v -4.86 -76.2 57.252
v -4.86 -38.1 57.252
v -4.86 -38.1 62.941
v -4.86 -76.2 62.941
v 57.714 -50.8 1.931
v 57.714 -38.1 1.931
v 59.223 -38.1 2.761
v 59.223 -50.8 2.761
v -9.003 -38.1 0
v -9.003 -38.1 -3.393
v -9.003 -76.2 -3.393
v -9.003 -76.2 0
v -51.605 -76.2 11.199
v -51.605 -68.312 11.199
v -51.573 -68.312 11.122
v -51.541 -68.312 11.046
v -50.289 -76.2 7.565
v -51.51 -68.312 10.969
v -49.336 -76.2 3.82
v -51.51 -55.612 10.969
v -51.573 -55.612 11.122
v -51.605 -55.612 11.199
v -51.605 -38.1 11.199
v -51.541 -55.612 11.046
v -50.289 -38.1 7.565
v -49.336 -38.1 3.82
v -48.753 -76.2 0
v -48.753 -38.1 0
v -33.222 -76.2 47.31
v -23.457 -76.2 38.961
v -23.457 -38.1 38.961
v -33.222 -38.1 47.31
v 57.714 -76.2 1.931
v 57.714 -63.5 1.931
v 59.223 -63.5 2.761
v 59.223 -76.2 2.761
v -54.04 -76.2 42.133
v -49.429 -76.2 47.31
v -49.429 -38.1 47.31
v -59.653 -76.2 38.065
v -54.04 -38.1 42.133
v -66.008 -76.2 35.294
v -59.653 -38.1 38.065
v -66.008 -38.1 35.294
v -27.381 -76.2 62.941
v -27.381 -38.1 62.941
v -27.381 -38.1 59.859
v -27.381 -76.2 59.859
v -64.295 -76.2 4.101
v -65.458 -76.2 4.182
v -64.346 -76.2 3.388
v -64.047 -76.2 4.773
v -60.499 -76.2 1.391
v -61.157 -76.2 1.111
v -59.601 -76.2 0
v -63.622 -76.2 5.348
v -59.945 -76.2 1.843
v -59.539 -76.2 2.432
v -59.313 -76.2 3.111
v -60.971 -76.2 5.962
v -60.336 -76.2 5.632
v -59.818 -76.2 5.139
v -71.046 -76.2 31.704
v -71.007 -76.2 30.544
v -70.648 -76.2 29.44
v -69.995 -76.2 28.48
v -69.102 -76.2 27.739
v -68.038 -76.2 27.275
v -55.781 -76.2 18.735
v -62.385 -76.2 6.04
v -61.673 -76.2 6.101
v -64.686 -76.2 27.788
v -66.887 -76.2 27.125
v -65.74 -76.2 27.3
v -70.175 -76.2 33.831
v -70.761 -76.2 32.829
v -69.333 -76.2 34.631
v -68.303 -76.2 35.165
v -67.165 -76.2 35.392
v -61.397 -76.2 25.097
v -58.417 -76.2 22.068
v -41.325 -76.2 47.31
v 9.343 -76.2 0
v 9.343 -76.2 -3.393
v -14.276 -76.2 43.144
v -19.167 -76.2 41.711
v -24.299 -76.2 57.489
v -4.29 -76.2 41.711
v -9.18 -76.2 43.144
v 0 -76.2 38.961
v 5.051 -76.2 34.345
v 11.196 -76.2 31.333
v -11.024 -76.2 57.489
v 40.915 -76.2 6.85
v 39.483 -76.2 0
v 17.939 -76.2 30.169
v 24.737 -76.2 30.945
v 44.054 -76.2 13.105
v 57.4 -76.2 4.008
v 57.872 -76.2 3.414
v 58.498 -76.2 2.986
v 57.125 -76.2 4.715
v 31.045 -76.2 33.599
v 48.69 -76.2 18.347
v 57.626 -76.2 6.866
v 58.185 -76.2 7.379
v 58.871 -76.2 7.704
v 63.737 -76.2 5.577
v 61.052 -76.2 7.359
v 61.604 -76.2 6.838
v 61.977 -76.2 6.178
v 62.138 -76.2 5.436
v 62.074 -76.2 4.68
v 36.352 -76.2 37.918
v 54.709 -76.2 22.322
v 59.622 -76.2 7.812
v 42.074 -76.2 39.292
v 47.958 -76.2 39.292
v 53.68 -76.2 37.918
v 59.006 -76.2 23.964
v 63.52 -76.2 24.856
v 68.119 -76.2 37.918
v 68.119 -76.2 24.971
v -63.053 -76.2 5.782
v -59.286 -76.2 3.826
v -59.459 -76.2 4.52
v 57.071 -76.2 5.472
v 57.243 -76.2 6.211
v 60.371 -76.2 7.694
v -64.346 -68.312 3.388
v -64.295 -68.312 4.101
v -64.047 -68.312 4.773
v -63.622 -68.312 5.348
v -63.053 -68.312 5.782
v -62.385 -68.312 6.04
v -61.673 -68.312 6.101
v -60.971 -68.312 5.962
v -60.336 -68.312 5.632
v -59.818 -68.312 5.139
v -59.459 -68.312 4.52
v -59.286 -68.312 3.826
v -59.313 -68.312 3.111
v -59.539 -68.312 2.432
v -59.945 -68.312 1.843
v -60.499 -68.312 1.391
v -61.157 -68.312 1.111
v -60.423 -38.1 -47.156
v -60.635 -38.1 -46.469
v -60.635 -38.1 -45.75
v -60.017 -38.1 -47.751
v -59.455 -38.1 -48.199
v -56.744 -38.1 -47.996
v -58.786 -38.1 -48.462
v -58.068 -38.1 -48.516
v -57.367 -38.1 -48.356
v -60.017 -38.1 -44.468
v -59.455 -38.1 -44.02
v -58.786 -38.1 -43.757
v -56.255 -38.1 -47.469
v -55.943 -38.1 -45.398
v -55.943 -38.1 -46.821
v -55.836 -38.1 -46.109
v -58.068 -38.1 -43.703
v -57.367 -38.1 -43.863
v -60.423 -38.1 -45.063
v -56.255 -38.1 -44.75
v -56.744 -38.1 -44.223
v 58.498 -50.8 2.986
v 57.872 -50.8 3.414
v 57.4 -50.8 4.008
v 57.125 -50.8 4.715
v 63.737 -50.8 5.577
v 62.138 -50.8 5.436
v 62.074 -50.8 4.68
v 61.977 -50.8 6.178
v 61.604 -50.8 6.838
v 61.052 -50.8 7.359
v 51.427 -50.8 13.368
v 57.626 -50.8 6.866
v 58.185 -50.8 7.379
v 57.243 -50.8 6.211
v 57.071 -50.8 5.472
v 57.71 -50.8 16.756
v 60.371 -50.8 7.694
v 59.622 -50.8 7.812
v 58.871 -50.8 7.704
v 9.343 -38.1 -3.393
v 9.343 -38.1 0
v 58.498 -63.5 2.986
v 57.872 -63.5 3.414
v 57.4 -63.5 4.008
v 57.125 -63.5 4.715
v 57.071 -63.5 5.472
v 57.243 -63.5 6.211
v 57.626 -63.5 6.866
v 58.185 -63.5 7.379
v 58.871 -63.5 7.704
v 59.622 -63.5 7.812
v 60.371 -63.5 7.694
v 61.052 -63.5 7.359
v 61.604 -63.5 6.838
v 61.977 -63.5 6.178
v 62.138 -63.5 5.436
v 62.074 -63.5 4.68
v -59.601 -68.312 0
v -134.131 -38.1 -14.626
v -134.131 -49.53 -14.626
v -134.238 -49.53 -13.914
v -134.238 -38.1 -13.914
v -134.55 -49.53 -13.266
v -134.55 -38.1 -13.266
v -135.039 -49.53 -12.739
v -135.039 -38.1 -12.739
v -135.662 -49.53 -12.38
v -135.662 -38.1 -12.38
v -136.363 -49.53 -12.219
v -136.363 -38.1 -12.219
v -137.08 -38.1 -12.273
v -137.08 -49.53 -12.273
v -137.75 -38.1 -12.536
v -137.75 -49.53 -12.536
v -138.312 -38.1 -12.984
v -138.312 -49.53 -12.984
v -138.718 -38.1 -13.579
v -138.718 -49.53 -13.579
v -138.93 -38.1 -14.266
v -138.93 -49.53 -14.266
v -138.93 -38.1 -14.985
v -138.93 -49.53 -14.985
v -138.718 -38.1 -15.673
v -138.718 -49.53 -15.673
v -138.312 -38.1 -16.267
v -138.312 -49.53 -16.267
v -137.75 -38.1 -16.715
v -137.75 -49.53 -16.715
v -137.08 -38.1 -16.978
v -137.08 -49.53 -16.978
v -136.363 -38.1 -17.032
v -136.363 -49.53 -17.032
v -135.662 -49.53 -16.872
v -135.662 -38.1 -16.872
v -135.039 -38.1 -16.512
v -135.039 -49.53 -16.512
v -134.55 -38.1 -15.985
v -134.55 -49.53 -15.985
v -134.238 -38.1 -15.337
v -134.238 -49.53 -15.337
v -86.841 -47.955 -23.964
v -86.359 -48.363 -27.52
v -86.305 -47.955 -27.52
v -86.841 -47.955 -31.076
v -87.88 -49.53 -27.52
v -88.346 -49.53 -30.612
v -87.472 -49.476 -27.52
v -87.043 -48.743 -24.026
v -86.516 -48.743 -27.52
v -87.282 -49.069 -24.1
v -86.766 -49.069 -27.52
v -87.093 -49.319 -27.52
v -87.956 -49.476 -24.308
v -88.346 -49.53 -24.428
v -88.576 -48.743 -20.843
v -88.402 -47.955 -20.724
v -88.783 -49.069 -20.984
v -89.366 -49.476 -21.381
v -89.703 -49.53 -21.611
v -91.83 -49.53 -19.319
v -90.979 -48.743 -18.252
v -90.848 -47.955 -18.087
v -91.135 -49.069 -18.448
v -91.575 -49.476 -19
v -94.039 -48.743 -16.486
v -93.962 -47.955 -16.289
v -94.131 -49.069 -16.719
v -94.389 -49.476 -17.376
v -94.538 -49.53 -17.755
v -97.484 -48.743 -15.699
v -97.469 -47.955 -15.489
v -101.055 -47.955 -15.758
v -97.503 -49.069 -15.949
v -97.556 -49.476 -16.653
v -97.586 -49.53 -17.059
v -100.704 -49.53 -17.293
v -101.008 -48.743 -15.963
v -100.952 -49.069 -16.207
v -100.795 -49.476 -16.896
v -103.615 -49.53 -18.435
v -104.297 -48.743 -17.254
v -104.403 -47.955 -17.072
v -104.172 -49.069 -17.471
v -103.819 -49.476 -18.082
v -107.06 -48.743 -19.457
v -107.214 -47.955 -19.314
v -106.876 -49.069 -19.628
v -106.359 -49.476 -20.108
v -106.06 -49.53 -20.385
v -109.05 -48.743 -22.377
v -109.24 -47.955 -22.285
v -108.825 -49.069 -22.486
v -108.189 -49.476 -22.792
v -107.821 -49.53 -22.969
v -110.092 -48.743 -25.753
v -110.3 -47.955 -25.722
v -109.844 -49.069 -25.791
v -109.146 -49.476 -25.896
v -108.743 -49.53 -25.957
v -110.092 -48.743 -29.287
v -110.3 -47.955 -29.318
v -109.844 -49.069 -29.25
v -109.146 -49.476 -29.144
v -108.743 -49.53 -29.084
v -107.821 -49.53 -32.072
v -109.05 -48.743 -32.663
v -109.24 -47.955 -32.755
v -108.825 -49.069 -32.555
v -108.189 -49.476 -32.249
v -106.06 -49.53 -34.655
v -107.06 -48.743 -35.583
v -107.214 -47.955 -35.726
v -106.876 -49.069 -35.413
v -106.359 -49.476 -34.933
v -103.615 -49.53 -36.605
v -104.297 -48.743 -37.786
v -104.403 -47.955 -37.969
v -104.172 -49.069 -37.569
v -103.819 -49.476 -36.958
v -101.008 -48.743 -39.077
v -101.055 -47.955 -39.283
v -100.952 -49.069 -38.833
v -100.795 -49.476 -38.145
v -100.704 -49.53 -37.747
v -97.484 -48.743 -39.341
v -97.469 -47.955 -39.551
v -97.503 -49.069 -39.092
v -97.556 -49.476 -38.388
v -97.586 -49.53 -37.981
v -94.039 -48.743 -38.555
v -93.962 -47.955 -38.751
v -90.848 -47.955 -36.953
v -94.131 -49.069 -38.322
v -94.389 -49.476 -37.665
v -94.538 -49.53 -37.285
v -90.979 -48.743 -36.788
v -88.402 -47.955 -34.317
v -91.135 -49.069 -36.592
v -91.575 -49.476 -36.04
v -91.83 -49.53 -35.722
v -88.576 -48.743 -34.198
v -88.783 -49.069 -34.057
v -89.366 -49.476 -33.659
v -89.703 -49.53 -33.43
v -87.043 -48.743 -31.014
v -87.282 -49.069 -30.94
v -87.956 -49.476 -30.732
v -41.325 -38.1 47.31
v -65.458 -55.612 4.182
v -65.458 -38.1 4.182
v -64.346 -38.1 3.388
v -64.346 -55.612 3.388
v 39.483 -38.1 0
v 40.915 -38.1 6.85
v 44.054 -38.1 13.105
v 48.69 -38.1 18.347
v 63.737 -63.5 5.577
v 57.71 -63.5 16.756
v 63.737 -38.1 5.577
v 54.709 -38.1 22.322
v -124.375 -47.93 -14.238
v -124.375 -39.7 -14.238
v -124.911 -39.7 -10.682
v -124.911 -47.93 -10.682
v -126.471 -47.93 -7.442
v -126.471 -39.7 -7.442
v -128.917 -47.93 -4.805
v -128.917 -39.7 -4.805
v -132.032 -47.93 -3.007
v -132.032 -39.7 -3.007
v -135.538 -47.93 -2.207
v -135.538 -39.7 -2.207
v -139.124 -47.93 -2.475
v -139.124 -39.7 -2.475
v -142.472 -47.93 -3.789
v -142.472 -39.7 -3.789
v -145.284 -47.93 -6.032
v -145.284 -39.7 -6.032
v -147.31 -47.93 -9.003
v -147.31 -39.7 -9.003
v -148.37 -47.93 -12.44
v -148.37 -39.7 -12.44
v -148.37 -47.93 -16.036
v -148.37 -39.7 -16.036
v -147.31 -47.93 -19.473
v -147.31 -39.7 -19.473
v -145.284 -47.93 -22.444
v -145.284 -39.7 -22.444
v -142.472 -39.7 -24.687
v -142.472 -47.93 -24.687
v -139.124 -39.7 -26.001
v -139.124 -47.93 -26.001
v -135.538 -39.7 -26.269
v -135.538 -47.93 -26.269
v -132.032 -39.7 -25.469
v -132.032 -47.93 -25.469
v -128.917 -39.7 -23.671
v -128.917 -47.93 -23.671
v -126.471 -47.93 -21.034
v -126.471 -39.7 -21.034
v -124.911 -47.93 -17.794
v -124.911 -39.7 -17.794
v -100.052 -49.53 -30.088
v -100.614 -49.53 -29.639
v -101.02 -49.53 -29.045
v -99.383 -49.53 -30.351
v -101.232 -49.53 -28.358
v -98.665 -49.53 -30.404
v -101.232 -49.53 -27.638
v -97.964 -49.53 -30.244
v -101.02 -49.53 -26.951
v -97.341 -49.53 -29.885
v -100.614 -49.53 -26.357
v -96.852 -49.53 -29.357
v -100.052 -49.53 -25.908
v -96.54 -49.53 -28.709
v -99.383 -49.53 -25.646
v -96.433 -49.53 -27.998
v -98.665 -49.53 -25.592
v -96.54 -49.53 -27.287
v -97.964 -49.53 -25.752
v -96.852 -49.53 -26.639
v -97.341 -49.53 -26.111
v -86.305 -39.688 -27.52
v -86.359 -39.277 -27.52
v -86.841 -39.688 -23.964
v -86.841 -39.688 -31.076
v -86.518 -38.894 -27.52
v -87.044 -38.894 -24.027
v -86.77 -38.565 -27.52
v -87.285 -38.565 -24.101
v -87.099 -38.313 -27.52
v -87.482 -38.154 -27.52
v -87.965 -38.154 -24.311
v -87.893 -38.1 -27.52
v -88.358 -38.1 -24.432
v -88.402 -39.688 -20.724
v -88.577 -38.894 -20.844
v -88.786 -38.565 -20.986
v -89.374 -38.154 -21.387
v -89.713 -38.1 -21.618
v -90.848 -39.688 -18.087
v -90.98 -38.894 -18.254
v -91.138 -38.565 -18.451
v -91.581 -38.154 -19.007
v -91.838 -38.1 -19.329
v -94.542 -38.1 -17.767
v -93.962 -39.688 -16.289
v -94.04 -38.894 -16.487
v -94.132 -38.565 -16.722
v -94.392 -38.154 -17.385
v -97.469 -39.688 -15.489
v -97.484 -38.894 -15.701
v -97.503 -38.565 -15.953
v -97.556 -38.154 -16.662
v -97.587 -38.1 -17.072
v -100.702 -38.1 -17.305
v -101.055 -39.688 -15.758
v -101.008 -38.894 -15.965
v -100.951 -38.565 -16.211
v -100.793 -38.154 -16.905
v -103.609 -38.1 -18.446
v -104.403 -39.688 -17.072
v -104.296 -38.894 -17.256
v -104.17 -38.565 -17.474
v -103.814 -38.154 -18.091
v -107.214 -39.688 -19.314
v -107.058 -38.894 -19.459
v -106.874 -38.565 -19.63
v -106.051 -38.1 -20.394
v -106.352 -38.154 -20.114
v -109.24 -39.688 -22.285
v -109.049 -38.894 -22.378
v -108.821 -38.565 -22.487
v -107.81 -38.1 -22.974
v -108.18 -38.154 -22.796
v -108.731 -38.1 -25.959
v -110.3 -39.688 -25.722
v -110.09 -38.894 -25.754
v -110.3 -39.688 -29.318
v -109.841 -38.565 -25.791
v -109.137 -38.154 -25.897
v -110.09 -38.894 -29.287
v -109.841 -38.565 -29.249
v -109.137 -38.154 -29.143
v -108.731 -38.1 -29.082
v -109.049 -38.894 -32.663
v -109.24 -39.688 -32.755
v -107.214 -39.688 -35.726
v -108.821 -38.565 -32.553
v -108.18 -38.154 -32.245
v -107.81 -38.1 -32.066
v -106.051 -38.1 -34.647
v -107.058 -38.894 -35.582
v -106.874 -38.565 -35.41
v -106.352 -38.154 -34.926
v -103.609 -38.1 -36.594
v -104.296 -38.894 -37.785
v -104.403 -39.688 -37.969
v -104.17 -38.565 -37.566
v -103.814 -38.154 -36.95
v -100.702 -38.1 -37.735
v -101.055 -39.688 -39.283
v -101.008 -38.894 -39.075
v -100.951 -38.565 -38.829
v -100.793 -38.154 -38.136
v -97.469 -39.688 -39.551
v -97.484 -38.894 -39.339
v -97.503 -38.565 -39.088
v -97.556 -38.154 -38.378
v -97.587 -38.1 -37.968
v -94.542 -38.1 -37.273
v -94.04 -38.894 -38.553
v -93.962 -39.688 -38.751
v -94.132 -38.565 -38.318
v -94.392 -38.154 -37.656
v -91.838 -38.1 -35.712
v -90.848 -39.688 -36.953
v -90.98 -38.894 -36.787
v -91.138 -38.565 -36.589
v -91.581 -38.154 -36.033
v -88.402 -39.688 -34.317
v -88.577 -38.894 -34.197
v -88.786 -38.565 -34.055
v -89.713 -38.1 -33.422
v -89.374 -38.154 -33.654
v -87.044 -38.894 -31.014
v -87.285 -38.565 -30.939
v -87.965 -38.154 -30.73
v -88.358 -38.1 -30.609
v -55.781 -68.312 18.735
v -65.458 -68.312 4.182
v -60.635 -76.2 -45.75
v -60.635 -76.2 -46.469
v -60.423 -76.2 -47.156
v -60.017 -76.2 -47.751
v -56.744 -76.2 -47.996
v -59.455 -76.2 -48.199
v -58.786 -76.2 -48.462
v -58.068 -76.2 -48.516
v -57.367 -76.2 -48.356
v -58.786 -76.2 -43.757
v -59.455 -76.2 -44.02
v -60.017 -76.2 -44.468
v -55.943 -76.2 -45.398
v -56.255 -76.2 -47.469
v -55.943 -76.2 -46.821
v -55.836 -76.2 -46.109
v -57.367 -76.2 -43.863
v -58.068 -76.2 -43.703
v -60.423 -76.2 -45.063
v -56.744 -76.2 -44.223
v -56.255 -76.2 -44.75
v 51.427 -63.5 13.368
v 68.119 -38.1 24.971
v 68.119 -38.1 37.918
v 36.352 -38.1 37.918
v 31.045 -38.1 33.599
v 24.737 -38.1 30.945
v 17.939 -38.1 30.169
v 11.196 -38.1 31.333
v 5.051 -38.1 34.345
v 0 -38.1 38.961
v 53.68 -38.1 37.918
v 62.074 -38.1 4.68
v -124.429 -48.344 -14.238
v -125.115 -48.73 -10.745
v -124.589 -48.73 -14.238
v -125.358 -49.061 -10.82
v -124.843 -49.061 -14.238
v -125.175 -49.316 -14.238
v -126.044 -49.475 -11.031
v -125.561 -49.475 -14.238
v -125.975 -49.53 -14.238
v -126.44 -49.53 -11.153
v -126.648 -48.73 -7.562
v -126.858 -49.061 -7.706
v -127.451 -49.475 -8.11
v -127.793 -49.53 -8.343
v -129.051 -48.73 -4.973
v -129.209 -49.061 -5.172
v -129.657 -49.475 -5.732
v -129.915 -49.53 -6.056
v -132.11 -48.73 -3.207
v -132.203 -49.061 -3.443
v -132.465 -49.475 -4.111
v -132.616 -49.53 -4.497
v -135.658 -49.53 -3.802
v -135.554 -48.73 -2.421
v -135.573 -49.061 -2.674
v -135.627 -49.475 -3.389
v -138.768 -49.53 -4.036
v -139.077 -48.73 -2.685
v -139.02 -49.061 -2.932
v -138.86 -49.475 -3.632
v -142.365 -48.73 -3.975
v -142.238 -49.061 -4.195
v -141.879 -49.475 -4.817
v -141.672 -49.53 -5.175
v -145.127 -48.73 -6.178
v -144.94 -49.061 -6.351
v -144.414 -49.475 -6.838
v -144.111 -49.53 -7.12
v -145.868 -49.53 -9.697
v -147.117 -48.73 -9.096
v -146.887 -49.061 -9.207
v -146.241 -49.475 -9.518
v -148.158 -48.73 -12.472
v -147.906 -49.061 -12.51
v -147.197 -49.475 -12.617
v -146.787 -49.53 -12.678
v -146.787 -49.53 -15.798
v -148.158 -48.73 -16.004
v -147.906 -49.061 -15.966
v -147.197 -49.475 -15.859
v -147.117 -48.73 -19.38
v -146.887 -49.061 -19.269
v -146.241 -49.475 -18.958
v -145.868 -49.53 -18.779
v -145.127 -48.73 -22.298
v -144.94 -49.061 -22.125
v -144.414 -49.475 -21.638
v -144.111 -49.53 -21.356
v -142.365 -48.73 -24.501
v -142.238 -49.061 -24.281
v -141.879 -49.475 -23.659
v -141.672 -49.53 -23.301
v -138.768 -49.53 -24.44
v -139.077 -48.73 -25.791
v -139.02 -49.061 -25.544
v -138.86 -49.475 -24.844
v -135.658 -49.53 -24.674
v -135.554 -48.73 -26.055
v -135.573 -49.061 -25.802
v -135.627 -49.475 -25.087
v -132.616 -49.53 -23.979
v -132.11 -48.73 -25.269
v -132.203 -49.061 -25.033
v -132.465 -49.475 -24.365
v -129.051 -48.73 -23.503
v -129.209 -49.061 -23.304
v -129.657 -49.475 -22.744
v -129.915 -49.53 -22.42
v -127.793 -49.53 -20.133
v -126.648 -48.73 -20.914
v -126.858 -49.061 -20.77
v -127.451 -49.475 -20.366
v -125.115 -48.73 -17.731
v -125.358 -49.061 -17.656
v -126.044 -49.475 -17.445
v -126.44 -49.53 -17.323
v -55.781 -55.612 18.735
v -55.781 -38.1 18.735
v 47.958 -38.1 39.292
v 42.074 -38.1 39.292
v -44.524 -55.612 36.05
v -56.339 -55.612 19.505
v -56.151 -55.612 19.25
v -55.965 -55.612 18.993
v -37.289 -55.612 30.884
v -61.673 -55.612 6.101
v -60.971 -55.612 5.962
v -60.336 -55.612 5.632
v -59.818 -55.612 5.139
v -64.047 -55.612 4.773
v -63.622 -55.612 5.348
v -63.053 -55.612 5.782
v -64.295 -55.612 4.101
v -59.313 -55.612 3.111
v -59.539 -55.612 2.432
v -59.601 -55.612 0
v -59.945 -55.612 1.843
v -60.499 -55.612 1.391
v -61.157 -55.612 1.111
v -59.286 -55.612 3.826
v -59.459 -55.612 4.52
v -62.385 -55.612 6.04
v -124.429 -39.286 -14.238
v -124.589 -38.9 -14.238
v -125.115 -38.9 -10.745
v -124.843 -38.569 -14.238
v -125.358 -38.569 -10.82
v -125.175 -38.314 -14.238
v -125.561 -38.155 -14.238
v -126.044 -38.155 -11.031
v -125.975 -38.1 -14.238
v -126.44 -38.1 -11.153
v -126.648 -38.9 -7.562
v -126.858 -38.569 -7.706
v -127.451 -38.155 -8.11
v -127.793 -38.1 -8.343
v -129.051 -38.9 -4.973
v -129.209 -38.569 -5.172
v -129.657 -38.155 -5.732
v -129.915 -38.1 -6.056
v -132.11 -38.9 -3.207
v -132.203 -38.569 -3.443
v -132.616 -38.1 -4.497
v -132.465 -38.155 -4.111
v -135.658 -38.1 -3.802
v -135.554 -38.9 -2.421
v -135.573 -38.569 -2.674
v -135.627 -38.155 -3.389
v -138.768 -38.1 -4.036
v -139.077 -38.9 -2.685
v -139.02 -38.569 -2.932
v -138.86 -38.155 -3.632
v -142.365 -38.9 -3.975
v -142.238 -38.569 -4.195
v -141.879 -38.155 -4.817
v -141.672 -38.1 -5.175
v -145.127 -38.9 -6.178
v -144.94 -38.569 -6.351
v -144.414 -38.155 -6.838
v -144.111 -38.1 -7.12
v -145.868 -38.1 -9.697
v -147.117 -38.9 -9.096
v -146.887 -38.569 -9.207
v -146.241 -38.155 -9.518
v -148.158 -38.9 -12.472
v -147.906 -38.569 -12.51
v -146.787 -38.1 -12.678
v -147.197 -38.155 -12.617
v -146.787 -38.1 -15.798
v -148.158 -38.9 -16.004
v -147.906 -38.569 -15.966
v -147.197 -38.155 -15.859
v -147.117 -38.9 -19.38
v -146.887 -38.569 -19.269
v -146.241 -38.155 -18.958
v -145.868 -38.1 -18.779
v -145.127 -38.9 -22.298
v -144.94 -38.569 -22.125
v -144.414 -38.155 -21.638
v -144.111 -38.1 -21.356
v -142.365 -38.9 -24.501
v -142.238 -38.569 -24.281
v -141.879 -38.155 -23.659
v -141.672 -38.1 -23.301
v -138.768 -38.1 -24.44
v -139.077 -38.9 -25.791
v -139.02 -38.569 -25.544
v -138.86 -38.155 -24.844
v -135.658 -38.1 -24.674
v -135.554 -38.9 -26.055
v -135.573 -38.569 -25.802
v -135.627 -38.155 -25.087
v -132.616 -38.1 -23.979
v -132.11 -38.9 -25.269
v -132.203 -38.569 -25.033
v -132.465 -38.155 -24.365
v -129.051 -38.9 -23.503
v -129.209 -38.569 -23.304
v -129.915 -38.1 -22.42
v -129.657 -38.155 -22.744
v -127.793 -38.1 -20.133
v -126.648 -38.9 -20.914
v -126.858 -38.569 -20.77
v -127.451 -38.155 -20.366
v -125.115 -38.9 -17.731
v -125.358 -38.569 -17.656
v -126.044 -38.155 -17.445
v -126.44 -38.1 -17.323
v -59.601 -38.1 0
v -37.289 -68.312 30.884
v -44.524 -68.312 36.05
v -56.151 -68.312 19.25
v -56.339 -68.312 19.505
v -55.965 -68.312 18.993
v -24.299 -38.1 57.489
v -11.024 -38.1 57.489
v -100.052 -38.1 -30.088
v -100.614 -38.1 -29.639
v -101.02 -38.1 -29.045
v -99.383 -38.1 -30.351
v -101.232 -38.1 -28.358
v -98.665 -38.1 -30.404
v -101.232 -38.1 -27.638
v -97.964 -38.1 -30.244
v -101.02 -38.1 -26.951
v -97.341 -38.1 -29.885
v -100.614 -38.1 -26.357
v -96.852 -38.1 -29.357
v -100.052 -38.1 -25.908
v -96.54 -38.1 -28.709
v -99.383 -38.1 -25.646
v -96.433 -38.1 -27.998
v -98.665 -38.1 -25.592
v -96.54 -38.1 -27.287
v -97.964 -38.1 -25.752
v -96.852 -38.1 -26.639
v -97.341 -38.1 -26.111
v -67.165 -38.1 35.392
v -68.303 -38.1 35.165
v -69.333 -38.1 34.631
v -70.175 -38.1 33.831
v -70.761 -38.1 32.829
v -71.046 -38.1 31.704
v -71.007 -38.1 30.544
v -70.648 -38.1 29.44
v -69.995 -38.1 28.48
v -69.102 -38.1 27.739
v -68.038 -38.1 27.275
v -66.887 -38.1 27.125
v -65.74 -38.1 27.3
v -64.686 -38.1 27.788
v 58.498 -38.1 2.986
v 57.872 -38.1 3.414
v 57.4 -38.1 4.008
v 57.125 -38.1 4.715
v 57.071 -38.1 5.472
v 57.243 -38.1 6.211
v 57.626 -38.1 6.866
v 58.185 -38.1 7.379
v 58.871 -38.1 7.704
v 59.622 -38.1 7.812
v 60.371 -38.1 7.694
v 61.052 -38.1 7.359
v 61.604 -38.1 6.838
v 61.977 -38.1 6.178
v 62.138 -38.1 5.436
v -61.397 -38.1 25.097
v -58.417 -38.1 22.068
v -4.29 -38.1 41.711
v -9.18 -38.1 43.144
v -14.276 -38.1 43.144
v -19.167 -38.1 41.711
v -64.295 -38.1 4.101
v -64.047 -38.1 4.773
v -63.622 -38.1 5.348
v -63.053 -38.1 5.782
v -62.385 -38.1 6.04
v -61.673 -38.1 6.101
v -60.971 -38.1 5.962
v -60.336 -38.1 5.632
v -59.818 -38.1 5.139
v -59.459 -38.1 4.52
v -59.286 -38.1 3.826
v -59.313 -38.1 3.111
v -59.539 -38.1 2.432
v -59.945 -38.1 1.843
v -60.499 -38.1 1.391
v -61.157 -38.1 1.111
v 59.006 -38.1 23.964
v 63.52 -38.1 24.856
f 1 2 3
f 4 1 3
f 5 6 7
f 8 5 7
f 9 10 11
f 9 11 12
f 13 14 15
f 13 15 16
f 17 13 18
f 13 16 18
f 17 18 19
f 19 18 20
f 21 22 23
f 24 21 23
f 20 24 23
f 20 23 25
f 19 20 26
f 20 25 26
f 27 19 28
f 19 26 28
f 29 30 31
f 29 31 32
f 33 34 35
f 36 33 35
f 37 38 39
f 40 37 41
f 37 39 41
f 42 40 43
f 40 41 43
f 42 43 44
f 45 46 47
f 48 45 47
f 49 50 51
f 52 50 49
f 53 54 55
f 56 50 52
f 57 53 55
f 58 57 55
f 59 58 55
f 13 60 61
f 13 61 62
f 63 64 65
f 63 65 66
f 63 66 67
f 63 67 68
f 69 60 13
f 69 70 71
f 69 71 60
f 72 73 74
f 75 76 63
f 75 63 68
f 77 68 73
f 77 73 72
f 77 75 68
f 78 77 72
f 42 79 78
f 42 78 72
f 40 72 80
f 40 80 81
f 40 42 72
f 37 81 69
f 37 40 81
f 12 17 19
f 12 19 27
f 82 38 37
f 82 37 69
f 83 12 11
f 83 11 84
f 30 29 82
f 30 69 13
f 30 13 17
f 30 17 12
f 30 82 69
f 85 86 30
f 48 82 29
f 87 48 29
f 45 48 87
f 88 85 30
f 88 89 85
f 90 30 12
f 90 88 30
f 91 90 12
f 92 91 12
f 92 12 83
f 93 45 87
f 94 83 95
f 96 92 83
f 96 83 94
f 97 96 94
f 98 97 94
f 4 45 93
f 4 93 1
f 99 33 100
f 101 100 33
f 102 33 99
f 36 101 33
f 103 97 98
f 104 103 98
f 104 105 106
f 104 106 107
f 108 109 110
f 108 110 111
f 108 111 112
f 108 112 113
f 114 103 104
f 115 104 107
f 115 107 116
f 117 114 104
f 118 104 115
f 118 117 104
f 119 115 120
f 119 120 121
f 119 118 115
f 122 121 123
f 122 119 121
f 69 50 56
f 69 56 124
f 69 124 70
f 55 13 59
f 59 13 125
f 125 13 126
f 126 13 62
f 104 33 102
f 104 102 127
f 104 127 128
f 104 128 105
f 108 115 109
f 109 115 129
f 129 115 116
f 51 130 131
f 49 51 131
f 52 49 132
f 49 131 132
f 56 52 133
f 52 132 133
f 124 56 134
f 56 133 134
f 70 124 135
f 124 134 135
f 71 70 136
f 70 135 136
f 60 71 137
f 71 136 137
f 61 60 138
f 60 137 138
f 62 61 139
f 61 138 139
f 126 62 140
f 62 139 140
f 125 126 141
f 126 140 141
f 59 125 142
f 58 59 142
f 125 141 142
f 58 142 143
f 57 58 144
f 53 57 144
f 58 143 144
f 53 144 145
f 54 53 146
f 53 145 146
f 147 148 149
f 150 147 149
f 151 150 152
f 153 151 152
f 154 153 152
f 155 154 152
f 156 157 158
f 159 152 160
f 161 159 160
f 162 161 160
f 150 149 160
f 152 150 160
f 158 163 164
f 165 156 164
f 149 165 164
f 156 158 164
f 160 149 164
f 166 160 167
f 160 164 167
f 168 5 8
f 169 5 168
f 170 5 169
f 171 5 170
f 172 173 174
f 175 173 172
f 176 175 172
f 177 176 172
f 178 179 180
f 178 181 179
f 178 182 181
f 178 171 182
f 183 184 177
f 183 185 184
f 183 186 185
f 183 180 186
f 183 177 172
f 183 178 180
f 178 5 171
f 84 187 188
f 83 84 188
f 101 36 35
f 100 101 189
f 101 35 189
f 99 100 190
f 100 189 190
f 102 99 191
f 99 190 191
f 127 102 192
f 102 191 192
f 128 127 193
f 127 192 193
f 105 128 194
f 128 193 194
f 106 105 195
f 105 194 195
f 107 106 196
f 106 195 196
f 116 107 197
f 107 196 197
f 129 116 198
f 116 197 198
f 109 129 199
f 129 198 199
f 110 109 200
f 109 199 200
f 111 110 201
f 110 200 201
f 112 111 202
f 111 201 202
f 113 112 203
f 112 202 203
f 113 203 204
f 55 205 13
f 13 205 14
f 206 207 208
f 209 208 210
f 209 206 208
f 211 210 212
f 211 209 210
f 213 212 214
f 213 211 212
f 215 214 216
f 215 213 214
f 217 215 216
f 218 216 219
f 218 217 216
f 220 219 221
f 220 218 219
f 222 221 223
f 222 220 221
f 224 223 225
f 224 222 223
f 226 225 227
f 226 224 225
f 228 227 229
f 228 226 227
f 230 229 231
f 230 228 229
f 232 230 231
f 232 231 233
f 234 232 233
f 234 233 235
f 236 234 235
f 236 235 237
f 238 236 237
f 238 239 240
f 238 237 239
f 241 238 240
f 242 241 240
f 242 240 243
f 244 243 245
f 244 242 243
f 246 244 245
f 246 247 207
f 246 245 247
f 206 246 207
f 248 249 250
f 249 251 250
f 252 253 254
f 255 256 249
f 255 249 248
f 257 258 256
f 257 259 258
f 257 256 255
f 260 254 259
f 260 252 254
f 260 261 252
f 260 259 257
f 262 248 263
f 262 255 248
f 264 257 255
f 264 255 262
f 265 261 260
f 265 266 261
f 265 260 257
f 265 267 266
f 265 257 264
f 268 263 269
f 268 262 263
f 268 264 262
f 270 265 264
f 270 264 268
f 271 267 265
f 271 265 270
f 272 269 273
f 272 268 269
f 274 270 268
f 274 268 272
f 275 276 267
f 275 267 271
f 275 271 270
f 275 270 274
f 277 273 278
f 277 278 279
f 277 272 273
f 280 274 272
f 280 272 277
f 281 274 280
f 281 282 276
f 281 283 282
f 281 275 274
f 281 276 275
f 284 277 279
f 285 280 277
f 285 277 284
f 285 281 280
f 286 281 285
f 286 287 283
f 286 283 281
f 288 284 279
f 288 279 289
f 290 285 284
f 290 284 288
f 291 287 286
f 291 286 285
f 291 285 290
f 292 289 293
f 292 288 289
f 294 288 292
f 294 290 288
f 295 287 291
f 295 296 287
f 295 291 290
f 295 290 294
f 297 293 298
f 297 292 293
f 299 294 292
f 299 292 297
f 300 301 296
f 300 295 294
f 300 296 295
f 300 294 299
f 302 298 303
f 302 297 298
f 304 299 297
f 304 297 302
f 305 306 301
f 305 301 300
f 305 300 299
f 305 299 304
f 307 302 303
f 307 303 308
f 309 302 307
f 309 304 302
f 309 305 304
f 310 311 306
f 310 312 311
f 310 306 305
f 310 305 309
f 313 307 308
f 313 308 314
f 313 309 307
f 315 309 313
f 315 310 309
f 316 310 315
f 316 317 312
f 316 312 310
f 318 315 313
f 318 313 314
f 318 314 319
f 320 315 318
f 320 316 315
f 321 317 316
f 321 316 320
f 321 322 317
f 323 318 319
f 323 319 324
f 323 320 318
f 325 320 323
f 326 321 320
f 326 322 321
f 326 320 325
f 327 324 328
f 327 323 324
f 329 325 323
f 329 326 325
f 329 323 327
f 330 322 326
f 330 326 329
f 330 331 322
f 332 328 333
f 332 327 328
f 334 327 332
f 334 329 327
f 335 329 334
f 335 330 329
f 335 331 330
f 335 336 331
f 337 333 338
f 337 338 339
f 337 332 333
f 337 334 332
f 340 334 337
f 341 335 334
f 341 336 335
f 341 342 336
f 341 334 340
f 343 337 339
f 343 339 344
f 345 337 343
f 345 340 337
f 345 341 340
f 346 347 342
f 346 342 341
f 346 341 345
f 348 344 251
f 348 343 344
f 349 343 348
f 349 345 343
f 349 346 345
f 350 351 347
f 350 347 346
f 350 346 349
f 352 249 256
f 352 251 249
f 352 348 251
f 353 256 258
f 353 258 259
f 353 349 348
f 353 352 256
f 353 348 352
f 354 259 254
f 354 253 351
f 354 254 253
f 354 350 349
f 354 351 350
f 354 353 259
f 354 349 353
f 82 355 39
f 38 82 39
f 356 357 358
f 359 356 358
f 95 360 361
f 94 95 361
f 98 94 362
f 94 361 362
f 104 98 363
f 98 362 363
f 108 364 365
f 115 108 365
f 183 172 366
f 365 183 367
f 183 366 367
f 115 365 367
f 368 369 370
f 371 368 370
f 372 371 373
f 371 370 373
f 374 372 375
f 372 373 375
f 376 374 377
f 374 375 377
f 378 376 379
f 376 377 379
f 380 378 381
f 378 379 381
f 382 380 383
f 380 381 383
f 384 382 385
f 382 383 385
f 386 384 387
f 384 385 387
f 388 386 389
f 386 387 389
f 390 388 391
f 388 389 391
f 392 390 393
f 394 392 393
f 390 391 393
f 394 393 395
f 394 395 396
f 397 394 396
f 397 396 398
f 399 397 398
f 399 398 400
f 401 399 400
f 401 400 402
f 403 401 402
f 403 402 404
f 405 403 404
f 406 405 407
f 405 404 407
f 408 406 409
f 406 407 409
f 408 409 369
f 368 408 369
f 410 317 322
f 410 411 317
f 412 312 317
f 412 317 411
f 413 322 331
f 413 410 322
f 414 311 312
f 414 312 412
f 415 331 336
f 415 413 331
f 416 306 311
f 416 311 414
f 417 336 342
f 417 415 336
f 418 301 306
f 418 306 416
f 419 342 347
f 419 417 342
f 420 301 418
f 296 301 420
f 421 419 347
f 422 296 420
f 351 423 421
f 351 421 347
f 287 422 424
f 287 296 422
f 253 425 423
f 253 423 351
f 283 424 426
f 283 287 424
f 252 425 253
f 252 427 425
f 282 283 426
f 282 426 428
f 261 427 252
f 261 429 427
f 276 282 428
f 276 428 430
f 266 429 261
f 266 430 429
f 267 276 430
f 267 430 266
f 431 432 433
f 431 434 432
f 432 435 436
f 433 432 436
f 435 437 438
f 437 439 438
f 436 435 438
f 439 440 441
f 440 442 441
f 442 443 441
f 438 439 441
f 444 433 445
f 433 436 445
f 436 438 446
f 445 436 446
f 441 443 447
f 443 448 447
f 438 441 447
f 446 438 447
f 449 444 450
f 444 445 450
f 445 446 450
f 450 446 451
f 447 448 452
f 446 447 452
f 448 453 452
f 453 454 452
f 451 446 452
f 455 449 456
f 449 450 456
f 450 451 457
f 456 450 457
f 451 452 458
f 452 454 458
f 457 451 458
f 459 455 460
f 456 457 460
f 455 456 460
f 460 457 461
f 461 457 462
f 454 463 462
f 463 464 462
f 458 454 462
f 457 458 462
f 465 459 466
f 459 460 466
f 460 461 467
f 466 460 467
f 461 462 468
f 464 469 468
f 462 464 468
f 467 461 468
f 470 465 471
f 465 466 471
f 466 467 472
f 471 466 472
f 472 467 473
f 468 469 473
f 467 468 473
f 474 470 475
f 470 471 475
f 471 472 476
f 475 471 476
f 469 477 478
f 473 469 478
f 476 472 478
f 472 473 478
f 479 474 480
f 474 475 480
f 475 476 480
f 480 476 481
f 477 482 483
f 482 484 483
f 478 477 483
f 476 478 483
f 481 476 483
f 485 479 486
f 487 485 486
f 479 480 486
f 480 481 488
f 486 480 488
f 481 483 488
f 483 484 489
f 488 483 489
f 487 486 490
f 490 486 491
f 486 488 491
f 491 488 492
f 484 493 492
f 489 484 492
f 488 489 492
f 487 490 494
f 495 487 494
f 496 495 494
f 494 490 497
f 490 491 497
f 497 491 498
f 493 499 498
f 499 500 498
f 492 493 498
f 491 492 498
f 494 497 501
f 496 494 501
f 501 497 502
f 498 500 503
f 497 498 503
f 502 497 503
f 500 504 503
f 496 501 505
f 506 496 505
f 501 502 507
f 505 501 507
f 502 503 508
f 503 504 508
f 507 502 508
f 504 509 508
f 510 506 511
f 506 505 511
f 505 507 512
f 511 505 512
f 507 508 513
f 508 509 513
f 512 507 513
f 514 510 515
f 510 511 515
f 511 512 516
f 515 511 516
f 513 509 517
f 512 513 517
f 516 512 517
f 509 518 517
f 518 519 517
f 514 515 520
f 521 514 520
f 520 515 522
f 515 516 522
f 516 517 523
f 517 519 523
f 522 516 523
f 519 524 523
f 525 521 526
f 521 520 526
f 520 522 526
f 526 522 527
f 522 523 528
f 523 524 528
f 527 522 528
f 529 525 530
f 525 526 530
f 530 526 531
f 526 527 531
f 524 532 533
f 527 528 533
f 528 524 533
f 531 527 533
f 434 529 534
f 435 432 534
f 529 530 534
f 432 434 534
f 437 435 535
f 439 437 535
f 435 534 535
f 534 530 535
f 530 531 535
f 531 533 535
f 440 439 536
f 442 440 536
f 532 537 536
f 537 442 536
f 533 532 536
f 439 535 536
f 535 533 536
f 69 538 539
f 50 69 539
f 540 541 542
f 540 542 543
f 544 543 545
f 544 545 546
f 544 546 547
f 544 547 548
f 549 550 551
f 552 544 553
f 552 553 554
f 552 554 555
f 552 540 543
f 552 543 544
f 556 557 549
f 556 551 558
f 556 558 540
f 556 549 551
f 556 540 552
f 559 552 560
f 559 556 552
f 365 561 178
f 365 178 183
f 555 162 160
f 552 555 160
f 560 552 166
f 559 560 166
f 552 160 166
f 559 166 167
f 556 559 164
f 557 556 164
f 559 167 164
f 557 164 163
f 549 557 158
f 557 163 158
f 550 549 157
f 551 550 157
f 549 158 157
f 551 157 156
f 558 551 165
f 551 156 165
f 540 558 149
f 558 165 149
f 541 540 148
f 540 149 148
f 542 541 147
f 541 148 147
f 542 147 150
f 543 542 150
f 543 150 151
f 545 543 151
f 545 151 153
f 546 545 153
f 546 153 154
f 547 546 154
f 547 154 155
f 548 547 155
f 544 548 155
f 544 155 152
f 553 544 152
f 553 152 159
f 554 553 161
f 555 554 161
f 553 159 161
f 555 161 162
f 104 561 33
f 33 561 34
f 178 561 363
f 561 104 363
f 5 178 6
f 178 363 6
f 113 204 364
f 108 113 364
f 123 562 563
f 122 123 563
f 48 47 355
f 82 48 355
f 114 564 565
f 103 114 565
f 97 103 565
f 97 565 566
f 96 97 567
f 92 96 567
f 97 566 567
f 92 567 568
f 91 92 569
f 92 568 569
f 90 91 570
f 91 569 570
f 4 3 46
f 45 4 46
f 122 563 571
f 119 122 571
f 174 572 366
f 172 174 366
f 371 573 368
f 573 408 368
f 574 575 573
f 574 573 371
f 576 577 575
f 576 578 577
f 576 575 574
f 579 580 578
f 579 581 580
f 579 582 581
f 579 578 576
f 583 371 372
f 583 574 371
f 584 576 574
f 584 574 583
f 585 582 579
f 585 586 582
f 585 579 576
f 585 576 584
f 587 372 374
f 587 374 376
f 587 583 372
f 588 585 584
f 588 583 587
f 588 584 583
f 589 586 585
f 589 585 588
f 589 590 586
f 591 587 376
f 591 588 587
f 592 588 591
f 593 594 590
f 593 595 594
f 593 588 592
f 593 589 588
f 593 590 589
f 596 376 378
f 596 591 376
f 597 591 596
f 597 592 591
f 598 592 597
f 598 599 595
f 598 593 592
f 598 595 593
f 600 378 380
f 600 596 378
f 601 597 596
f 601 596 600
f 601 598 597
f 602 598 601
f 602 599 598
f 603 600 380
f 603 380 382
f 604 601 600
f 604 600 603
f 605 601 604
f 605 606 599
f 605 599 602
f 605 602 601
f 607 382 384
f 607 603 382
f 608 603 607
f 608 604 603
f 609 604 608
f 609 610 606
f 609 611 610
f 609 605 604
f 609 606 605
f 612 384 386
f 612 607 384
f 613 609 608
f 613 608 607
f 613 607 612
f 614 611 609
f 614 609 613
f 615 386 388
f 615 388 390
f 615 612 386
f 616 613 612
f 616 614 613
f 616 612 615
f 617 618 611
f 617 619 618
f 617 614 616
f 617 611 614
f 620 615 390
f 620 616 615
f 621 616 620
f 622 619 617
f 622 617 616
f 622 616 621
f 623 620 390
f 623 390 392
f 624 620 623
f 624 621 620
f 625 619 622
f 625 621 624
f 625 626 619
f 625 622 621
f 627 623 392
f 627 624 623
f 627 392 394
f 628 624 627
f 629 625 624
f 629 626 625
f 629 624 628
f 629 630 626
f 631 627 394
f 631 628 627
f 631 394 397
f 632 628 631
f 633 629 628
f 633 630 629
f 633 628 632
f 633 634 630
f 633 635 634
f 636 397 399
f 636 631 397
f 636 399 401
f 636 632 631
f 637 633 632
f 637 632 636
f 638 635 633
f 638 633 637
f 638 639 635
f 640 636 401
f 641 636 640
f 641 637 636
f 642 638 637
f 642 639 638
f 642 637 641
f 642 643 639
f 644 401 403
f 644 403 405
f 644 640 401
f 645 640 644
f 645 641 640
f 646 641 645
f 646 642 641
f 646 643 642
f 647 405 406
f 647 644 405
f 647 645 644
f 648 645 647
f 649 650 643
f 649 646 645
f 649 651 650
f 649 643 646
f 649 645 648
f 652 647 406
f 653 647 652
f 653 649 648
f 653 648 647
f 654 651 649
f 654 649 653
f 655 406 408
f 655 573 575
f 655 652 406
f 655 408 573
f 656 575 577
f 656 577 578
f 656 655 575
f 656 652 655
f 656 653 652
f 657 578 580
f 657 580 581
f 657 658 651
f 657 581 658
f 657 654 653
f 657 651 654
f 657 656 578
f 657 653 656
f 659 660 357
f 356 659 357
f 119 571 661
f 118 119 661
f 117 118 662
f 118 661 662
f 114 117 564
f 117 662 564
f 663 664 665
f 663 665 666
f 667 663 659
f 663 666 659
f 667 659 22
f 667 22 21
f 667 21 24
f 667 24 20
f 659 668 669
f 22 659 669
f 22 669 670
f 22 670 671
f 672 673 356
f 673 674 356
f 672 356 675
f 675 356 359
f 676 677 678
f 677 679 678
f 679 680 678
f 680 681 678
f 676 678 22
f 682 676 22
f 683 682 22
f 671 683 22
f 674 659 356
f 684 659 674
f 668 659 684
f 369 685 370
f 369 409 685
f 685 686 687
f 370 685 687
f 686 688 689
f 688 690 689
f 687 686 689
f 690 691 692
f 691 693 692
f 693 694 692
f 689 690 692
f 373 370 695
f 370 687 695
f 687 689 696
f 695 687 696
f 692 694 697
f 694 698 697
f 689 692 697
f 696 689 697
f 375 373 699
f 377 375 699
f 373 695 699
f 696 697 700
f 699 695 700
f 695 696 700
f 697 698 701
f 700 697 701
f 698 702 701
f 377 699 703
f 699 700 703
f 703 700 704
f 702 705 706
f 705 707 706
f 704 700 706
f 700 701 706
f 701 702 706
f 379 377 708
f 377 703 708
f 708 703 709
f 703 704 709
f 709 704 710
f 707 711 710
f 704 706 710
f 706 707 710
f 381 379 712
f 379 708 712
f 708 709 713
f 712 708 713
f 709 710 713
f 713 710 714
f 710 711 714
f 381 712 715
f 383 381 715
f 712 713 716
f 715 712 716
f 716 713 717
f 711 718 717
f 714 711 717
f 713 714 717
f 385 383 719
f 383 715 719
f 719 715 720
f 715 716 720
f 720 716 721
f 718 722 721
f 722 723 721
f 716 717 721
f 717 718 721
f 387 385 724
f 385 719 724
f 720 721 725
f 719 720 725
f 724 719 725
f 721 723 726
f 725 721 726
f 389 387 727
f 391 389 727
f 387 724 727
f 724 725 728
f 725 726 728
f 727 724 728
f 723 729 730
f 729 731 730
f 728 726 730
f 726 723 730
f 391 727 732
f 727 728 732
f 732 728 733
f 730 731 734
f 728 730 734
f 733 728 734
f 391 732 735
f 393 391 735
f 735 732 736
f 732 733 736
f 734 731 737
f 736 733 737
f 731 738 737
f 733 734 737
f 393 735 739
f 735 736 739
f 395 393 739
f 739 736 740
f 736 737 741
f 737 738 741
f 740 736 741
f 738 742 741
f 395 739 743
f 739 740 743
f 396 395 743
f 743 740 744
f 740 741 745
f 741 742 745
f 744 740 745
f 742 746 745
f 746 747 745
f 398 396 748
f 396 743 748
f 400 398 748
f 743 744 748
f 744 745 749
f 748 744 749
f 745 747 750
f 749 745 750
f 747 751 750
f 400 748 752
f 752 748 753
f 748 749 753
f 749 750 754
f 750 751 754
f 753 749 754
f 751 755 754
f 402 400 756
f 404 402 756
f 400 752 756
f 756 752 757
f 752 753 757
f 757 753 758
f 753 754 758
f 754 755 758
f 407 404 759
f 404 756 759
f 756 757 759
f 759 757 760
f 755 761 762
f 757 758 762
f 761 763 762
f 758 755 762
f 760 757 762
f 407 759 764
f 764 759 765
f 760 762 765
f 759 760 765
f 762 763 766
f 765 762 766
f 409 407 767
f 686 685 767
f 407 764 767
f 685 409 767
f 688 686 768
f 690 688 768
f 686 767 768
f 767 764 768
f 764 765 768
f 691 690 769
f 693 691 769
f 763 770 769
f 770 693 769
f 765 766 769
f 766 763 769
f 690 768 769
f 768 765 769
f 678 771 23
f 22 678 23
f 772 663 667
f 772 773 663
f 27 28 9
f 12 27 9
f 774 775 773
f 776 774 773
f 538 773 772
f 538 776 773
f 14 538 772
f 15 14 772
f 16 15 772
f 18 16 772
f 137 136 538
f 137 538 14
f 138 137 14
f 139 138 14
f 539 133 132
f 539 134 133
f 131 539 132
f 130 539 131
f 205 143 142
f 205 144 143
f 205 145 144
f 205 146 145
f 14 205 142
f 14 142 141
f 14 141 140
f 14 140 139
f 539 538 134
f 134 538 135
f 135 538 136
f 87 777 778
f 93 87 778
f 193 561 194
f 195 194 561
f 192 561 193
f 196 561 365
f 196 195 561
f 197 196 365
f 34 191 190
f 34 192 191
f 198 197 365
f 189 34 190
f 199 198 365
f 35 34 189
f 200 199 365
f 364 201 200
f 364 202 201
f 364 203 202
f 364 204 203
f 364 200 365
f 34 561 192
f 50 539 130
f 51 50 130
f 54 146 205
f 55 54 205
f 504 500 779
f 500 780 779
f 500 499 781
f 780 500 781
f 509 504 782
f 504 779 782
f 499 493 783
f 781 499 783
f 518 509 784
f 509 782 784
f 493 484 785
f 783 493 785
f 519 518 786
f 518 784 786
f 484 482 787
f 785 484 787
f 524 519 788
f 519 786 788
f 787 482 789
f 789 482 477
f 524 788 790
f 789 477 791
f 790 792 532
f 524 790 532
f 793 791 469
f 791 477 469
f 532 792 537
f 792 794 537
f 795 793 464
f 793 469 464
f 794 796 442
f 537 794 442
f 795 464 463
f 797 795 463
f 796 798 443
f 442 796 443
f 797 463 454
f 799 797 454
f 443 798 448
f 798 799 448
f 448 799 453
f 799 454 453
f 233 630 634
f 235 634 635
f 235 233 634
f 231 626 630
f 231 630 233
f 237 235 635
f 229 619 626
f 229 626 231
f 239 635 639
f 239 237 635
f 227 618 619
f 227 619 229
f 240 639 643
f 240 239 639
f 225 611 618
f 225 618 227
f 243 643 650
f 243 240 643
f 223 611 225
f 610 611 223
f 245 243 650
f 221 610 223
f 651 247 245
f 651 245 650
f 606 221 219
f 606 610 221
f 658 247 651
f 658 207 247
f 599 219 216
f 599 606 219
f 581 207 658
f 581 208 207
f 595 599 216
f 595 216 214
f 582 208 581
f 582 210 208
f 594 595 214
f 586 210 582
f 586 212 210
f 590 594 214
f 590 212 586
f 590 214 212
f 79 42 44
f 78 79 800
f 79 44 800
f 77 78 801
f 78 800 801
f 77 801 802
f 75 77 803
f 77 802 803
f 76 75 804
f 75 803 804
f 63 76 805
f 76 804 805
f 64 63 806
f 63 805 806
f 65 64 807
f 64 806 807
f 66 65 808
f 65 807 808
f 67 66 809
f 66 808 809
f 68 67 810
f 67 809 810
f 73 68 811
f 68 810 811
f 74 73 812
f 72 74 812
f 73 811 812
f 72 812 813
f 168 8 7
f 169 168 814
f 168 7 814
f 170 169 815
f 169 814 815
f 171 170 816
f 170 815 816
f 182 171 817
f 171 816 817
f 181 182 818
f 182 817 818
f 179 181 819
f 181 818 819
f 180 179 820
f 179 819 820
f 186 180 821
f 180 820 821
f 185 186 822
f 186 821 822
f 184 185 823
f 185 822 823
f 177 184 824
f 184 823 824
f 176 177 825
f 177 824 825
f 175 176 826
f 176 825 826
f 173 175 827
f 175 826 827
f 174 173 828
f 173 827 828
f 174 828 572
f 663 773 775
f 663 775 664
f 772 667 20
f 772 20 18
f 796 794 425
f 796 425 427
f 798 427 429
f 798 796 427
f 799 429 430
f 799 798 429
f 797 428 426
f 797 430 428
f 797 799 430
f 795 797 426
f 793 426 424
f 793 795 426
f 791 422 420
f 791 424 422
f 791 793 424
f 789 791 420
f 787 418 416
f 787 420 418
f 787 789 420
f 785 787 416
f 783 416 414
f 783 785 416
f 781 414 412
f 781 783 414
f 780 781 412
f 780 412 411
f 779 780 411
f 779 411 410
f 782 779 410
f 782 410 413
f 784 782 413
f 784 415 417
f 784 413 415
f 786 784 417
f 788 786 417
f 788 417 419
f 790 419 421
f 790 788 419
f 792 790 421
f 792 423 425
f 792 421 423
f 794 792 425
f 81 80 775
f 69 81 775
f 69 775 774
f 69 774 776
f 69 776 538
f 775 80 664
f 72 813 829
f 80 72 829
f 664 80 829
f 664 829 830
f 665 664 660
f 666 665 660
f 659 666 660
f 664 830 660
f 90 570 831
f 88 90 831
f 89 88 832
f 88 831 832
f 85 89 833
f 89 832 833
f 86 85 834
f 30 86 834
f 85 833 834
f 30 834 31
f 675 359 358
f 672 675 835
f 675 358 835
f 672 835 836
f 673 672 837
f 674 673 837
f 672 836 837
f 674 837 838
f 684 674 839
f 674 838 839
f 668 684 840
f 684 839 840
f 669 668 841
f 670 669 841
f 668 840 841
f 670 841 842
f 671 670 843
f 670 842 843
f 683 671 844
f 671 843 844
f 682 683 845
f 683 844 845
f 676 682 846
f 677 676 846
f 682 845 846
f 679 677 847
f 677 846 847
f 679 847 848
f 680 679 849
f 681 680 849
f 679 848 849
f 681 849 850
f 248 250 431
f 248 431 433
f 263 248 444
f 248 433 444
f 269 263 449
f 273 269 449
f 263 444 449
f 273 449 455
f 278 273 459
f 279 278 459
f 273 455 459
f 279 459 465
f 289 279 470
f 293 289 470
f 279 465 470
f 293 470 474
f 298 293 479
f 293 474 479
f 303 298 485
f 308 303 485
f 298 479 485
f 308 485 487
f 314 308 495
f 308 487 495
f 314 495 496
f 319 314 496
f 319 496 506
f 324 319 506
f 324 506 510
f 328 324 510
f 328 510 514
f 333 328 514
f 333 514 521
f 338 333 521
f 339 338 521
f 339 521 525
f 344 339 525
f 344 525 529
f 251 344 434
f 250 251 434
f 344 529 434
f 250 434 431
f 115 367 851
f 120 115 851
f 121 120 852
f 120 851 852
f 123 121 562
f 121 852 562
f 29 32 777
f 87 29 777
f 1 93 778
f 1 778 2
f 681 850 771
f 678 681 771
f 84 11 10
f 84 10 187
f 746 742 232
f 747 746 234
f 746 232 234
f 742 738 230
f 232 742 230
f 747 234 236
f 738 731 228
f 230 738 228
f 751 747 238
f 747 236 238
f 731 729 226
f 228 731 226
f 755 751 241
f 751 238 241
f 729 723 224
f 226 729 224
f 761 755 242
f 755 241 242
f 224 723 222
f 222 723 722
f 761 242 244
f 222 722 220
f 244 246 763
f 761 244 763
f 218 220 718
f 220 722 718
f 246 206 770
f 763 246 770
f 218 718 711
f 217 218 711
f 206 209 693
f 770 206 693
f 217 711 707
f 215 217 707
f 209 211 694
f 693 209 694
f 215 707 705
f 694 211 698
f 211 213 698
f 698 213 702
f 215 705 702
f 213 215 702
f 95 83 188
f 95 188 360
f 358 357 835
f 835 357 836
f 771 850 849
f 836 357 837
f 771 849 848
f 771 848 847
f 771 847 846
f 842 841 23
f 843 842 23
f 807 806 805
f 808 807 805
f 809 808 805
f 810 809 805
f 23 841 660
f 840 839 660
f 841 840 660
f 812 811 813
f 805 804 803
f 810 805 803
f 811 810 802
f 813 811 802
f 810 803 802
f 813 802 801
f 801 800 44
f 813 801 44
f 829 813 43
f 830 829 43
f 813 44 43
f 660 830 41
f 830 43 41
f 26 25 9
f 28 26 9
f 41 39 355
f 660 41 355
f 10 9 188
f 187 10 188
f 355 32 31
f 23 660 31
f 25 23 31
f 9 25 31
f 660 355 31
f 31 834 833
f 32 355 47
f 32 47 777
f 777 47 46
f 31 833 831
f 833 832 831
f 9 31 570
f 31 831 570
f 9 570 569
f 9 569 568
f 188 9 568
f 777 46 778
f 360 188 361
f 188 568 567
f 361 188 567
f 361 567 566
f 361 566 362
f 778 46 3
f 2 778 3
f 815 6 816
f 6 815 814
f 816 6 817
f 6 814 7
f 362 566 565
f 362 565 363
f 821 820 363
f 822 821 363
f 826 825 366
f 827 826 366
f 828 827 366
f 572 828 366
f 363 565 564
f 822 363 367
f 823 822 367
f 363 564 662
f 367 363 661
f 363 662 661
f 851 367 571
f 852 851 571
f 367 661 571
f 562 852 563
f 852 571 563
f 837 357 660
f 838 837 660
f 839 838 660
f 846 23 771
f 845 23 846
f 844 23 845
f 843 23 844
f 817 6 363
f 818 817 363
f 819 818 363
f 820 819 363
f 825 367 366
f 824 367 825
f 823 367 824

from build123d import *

# Parameters (mm, degrees)
F1_W          = 18.346240744
F1_H          = 3.3933587838
F2_DEPTH      = 38.1
F3_W          = 7.62
F3_H          = 6.35
F4_DEPTH      = 12.7
F5_DEPTH      = 12.7
F5_DEPTH_BACK = 2.54
F7_W          = 7.62
F7_H          = 6.35
F8_DEPTH      = 25.4
F6_R          = 12.065
F9_DEPTH      = 11.43
F10_DEPTH     = 11.43
F11_R         = 1.5748
F12_R         = 1.5875
F13_DEPTH     = 12.7
F14_R         = 2.413
F15_DEPTH     = 38.1
F16_W         = 8.89
F16_H         = 6.35
F17_DEPTH     = 38.1
F18_R         = 12.065
F19_DEPTH     = 11.43
F20_DEPTH     = 38.1
F21_R         = 1.6002
F22_R         = 2.413
F23_DEPTH     = 25.4
F24_R         = 2.413
F25_DEPTH     = 50.8


with BuildPart() as f2:
    # F1 (on offset) → F2 (new body)
    with BuildSketch(Plane.XZ.offset(38.1)):
        with BuildLine():
            ThreePointArc((36.3523699343, 37.9177816212), (17.938739529, 30.168583093), (0, 38.961391896))
            ThreePointArc((0, 38.961391896), (-11.7283733562, 43.325750799), (-23.4567467123, 38.961391896))
            Line((-23.4567467123, 38.961391896), (-33.2215428352, 47.3102629185))
            Line((-33.2215428352, 47.3102629185), (-41.3254767033, 47.3102629185))
            Line((-41.3254767033, 47.3102629185), (-49.4294105714, 47.3102629185))
            ThreePointArc((-49.4294105714, 47.3102629185), (-56.7367498982, 39.9472569025), (-66.0079442432, 35.2936538851))
            Line((-66.0079442432, 35.2936538851), (-64.6862429176, 27.7878297377))
            ThreePointArc((-64.6862429176, 27.7878297377), (-59.8664666899, 23.6224354299), (-55.7805365855, 18.7351122561))
            ThreePointArc((-55.7805365855, 18.7351122561), (-53.4862447079, 15.0812512527), (-51.6049943174, 11.198549562))
            ThreePointArc((-51.6049943174, 11.198549562), (-49.7666461925, 5.7043305896), (-48.7534441054, 0))
            Line((-48.7534441054, 0), (-9.0032480657, 0))
            Line((-9.0032480657, 0), (9.3429926783, 0))
            Line((9.3429926783, 0), (39.4831933081, 0))
            ThreePointArc((39.4831933081, 0), (42.2814677608, 10.0792595054), (48.6897520328, 18.3470103953))
            ThreePointArc((48.6897520328, 18.3470103953), (51.5664674426, 20.5356473215), (54.7089455641, 22.3218316343))
            ThreePointArc((54.7089455641, 22.3218316343), (61.2440855838, 24.5062290424), (68.1189224124, 24.9712727964))
            Line((68.1189224124, 24.9712727964), (68.1189224124, 37.9177816212))
            Line((68.1189224124, 37.9177816212), (53.6801107228, 37.9177816212))
            ThreePointArc((53.6801107228, 37.9177816212), (45.0162403286, 39.4653134808), (36.3523699343, 37.9177816212))
        make_face()
        Polygon((-41.3254767033, 47.3102629185), (-33.2215428352, 47.3102629185), (-24.299332872, 57.4886649847), (-11.0235996544, 57.4886649847), (-11.0235996544, 62.9412010312), (-27.3812003434, 62.9412010312), (-27.3812003434, 59.8593354225), align=None)
        Polygon((-11.0235996544, 62.9412010312), (-11.0235996544, 57.4886649847), (-4.8598670401, 57.251598686), (-4.8598670401, 62.9412010312), align=None)
        with BuildLine():
            Line((63.7368187308, 5.5770496838), (54.7089455641, 22.3218316343))
            ThreePointArc((54.7089455641, 22.3218316343), (51.5664674426, 20.5356473215), (48.6897520328, 18.3470103953))
            Line((48.6897520328, 18.3470103953), (57.713739574, 1.9314482342))
            Line((57.713739574, 1.9314482342), (59.2228821475, 2.7610563614))
            ThreePointArc((59.2228821475, 2.7610563614), (58.1850528969, 7.3793378634), (62.0736384197, 4.6803535699))
            Line((62.0736384197, 4.6803535699), (63.7368187308, 5.5770496838))
        make_face()
        with BuildLine():
            Line((-64.6862429176, 27.7878297377), (-66.0079442432, 35.2936538851))
            ThreePointArc((-66.0079442432, 35.2936538851), (-71.0073326122, 30.5440297536), (-64.6862429176, 27.7878297377))
        make_face()
        with BuildLine():
            ThreePointArc((-51.6049943174, 11.198549562), (-53.4862447079, 15.0812512527), (-55.7805365855, 18.7351122561))
            Line((-55.7805365855, 18.7351122561), (-65.4575312239, 4.1816343999))
            Line((-65.4575312239, 4.1816343999), (-64.3459226379, 3.387893301))
            ThreePointArc((-64.3459226379, 3.387893301), (-60.3361013948, 5.6323350995), (-61.1573117392, 1.1110743286))
            Line((-61.1573117392, 1.1110743286), (-59.6012882888, 0))
            Line((-59.6012882888, 0), (-51.6049943174, 11.198549562))
        make_face()
        with Locations((0.1698723063, -1.6966793919)):
            Rectangle(F1_W, F1_H)
    extrude(amount=F2_DEPTH)

    # F3 (on face) → F4 (cut)
    with BuildSketch(Plane(origin=(12.0247195907, 0, -22.3032937929), x_dir=(0.8802196822, 0, 0.4745664454), z_dir=(0.4745664454, 0, -0.8802196822))):
        with Locations((54.9390829703, 53.975)):
            Rectangle(F3_W, F3_H)
        with Locations((54.9390829703, 60.325)):
            Rectangle(F3_W, F3_H)
    extrude(amount=-F4_DEPTH, mode=Mode.SUBTRACT)

    # F3 (on face) → F5 (cut, two sides)
    with BuildSketch(Plane(origin=(12.0247195907, 0, -22.3032937929), x_dir=(0.8802196822, 0, 0.4745664454), z_dir=(0.4745664454, 0, -0.8802196822))) as f5_sk:
        with Locations((54.9390829703, 53.975)):
            Rectangle(F3_W, F3_H)
        with Locations((54.9390829703, 60.325)):
            Rectangle(F3_W, F3_H)
    extrude(amount=-F5_DEPTH, mode=Mode.SUBTRACT)
    extrude(f5_sk.sketch, amount=F5_DEPTH_BACK, mode=Mode.SUBTRACT)

    # F7 (on Top) → F8 (cut)
    with BuildSketch(Plane.XY):
        with Locations((-58.6418677121, -57.1051912602)):
            Rectangle(F7_W, F7_H)
        Polygon((-62.4518677121, -47.5801912602), (-62.4518677121, -53.9301912602), (-54.8318677121, -53.9301912602), (-54.8689477146, -47.5801912602), align=None)
    extrude(amount=-F8_DEPTH, mode=Mode.SUBTRACT)

    # F7 (on Top) → F13 (cut)
    with BuildSketch(Plane.XY):
        with Locations((-58.6418677121, -57.1051912602)):
            Rectangle(F7_W, F7_H)
        Polygon((-62.4518677121, -47.5801912602), (-62.4518677121, -53.9301912602), (-54.8318677121, -53.9301912602), (-54.8689477146, -47.5801912602), align=None)
    extrude(amount=-F13_DEPTH, mode=Mode.SUBTRACT)

    # F16 (on face) → F17 (cut)
    with BuildSketch(Plane(origin=(-20.1266689027, 0, -28.1867450133), x_dir=(0.8138252345, 0, -0.5811097036), z_dir=(-0.5811097036, 0, -0.8138252345))):
        with Locations((-52.739286169, 58.787003532)):
            Rectangle(F16_W, F16_H)
        with Locations((-52.739286169, 65.137003532)):
            Rectangle(F16_W, F16_H)
    extrude(amount=-F17_DEPTH, mode=Mode.SUBTRACT)

    # F16 (on face) → F20 (cut)
    with BuildSketch(Plane(origin=(-20.1266689027, 0, -28.1867450133), x_dir=(0.8138252345, 0, -0.5811097036), z_dir=(-0.5811097036, 0, -0.8138252345))):
        with Locations((-52.739286169, 58.787003532)):
            Rectangle(F16_W, F16_H)
        with Locations((-52.739286169, 65.137003532)):
            Rectangle(F16_W, F16_H)
    extrude(amount=-F20_DEPTH, mode=Mode.SUBTRACT)


with BuildPart() as f9:
    # F6 (on offset) → F9 (new body)
    with BuildSketch(Plane.XZ.offset(38.1)):
        with Locations((-98.3701199293, -27.5202151388)):
            Circle(F6_R)
    extrude(amount=F9_DEPTH)

    # F6 (on offset) → F10 (join)
    with BuildSketch(Plane.XZ.offset(38.1)):
        with Locations((-98.3701199293, -27.5202151388)):
            Circle(F6_R)
    extrude(amount=F10_DEPTH)

    # F11
    f11_edges = [f9.edges().sort_by_distance(p)[0] for p in [
        (-110.43512, -49.53, -27.520215),
    ]]
    fillet(f11_edges, radius=F11_R)

    # F12
    f12_edges = [f9.edges().sort_by_distance(p)[0] for p in [
        (-110.43512, -38.1, -27.520215),
    ]]
    fillet(f12_edges, radius=F12_R)

    # F24 (on Front) → F25 (cut)
    with BuildSketch(Plane.XZ):
        with Locations((-98.8455787301, -27.9980506748)):
            Circle(F24_R)
    extrude(amount=F25_DEPTH, mode=Mode.SUBTRACT)


with BuildPart() as f15:
    # F14 (on offset) → F15 (new body)
    with BuildSketch(Plane.XZ.offset(38.1)):
        with Locations((-58.2486279309, -46.1094640195)):
            Circle(F14_R)
    extrude(amount=F15_DEPTH)


with BuildPart() as f19:
    # F18 (on offset) → F19 (new body)
    with BuildSketch(Plane.XZ.offset(38.1)):
        with Locations((-136.4395618439, -14.2379999161)):
            Circle(F18_R)
    extrude(amount=F19_DEPTH)

    # F21
    f21_edges = [f19.edges().sort_by_distance(p)[0] for p in [
        (-148.504562, -38.1, -14.238),
        (-148.504562, -49.53, -14.238),
    ]]
    fillet(f21_edges, radius=F21_R)

    # F22 (on offset) → F23 (cut)
    with BuildSketch(Plane.XZ.offset(38.1)):
        with Locations((-136.5435421467, -14.6257244051)):
            Circle(F22_R)
    extrude(amount=F23_DEPTH, mode=Mode.SUBTRACT)


solid = Compound([f2.part, f9.part, f15.part, f19.part])
